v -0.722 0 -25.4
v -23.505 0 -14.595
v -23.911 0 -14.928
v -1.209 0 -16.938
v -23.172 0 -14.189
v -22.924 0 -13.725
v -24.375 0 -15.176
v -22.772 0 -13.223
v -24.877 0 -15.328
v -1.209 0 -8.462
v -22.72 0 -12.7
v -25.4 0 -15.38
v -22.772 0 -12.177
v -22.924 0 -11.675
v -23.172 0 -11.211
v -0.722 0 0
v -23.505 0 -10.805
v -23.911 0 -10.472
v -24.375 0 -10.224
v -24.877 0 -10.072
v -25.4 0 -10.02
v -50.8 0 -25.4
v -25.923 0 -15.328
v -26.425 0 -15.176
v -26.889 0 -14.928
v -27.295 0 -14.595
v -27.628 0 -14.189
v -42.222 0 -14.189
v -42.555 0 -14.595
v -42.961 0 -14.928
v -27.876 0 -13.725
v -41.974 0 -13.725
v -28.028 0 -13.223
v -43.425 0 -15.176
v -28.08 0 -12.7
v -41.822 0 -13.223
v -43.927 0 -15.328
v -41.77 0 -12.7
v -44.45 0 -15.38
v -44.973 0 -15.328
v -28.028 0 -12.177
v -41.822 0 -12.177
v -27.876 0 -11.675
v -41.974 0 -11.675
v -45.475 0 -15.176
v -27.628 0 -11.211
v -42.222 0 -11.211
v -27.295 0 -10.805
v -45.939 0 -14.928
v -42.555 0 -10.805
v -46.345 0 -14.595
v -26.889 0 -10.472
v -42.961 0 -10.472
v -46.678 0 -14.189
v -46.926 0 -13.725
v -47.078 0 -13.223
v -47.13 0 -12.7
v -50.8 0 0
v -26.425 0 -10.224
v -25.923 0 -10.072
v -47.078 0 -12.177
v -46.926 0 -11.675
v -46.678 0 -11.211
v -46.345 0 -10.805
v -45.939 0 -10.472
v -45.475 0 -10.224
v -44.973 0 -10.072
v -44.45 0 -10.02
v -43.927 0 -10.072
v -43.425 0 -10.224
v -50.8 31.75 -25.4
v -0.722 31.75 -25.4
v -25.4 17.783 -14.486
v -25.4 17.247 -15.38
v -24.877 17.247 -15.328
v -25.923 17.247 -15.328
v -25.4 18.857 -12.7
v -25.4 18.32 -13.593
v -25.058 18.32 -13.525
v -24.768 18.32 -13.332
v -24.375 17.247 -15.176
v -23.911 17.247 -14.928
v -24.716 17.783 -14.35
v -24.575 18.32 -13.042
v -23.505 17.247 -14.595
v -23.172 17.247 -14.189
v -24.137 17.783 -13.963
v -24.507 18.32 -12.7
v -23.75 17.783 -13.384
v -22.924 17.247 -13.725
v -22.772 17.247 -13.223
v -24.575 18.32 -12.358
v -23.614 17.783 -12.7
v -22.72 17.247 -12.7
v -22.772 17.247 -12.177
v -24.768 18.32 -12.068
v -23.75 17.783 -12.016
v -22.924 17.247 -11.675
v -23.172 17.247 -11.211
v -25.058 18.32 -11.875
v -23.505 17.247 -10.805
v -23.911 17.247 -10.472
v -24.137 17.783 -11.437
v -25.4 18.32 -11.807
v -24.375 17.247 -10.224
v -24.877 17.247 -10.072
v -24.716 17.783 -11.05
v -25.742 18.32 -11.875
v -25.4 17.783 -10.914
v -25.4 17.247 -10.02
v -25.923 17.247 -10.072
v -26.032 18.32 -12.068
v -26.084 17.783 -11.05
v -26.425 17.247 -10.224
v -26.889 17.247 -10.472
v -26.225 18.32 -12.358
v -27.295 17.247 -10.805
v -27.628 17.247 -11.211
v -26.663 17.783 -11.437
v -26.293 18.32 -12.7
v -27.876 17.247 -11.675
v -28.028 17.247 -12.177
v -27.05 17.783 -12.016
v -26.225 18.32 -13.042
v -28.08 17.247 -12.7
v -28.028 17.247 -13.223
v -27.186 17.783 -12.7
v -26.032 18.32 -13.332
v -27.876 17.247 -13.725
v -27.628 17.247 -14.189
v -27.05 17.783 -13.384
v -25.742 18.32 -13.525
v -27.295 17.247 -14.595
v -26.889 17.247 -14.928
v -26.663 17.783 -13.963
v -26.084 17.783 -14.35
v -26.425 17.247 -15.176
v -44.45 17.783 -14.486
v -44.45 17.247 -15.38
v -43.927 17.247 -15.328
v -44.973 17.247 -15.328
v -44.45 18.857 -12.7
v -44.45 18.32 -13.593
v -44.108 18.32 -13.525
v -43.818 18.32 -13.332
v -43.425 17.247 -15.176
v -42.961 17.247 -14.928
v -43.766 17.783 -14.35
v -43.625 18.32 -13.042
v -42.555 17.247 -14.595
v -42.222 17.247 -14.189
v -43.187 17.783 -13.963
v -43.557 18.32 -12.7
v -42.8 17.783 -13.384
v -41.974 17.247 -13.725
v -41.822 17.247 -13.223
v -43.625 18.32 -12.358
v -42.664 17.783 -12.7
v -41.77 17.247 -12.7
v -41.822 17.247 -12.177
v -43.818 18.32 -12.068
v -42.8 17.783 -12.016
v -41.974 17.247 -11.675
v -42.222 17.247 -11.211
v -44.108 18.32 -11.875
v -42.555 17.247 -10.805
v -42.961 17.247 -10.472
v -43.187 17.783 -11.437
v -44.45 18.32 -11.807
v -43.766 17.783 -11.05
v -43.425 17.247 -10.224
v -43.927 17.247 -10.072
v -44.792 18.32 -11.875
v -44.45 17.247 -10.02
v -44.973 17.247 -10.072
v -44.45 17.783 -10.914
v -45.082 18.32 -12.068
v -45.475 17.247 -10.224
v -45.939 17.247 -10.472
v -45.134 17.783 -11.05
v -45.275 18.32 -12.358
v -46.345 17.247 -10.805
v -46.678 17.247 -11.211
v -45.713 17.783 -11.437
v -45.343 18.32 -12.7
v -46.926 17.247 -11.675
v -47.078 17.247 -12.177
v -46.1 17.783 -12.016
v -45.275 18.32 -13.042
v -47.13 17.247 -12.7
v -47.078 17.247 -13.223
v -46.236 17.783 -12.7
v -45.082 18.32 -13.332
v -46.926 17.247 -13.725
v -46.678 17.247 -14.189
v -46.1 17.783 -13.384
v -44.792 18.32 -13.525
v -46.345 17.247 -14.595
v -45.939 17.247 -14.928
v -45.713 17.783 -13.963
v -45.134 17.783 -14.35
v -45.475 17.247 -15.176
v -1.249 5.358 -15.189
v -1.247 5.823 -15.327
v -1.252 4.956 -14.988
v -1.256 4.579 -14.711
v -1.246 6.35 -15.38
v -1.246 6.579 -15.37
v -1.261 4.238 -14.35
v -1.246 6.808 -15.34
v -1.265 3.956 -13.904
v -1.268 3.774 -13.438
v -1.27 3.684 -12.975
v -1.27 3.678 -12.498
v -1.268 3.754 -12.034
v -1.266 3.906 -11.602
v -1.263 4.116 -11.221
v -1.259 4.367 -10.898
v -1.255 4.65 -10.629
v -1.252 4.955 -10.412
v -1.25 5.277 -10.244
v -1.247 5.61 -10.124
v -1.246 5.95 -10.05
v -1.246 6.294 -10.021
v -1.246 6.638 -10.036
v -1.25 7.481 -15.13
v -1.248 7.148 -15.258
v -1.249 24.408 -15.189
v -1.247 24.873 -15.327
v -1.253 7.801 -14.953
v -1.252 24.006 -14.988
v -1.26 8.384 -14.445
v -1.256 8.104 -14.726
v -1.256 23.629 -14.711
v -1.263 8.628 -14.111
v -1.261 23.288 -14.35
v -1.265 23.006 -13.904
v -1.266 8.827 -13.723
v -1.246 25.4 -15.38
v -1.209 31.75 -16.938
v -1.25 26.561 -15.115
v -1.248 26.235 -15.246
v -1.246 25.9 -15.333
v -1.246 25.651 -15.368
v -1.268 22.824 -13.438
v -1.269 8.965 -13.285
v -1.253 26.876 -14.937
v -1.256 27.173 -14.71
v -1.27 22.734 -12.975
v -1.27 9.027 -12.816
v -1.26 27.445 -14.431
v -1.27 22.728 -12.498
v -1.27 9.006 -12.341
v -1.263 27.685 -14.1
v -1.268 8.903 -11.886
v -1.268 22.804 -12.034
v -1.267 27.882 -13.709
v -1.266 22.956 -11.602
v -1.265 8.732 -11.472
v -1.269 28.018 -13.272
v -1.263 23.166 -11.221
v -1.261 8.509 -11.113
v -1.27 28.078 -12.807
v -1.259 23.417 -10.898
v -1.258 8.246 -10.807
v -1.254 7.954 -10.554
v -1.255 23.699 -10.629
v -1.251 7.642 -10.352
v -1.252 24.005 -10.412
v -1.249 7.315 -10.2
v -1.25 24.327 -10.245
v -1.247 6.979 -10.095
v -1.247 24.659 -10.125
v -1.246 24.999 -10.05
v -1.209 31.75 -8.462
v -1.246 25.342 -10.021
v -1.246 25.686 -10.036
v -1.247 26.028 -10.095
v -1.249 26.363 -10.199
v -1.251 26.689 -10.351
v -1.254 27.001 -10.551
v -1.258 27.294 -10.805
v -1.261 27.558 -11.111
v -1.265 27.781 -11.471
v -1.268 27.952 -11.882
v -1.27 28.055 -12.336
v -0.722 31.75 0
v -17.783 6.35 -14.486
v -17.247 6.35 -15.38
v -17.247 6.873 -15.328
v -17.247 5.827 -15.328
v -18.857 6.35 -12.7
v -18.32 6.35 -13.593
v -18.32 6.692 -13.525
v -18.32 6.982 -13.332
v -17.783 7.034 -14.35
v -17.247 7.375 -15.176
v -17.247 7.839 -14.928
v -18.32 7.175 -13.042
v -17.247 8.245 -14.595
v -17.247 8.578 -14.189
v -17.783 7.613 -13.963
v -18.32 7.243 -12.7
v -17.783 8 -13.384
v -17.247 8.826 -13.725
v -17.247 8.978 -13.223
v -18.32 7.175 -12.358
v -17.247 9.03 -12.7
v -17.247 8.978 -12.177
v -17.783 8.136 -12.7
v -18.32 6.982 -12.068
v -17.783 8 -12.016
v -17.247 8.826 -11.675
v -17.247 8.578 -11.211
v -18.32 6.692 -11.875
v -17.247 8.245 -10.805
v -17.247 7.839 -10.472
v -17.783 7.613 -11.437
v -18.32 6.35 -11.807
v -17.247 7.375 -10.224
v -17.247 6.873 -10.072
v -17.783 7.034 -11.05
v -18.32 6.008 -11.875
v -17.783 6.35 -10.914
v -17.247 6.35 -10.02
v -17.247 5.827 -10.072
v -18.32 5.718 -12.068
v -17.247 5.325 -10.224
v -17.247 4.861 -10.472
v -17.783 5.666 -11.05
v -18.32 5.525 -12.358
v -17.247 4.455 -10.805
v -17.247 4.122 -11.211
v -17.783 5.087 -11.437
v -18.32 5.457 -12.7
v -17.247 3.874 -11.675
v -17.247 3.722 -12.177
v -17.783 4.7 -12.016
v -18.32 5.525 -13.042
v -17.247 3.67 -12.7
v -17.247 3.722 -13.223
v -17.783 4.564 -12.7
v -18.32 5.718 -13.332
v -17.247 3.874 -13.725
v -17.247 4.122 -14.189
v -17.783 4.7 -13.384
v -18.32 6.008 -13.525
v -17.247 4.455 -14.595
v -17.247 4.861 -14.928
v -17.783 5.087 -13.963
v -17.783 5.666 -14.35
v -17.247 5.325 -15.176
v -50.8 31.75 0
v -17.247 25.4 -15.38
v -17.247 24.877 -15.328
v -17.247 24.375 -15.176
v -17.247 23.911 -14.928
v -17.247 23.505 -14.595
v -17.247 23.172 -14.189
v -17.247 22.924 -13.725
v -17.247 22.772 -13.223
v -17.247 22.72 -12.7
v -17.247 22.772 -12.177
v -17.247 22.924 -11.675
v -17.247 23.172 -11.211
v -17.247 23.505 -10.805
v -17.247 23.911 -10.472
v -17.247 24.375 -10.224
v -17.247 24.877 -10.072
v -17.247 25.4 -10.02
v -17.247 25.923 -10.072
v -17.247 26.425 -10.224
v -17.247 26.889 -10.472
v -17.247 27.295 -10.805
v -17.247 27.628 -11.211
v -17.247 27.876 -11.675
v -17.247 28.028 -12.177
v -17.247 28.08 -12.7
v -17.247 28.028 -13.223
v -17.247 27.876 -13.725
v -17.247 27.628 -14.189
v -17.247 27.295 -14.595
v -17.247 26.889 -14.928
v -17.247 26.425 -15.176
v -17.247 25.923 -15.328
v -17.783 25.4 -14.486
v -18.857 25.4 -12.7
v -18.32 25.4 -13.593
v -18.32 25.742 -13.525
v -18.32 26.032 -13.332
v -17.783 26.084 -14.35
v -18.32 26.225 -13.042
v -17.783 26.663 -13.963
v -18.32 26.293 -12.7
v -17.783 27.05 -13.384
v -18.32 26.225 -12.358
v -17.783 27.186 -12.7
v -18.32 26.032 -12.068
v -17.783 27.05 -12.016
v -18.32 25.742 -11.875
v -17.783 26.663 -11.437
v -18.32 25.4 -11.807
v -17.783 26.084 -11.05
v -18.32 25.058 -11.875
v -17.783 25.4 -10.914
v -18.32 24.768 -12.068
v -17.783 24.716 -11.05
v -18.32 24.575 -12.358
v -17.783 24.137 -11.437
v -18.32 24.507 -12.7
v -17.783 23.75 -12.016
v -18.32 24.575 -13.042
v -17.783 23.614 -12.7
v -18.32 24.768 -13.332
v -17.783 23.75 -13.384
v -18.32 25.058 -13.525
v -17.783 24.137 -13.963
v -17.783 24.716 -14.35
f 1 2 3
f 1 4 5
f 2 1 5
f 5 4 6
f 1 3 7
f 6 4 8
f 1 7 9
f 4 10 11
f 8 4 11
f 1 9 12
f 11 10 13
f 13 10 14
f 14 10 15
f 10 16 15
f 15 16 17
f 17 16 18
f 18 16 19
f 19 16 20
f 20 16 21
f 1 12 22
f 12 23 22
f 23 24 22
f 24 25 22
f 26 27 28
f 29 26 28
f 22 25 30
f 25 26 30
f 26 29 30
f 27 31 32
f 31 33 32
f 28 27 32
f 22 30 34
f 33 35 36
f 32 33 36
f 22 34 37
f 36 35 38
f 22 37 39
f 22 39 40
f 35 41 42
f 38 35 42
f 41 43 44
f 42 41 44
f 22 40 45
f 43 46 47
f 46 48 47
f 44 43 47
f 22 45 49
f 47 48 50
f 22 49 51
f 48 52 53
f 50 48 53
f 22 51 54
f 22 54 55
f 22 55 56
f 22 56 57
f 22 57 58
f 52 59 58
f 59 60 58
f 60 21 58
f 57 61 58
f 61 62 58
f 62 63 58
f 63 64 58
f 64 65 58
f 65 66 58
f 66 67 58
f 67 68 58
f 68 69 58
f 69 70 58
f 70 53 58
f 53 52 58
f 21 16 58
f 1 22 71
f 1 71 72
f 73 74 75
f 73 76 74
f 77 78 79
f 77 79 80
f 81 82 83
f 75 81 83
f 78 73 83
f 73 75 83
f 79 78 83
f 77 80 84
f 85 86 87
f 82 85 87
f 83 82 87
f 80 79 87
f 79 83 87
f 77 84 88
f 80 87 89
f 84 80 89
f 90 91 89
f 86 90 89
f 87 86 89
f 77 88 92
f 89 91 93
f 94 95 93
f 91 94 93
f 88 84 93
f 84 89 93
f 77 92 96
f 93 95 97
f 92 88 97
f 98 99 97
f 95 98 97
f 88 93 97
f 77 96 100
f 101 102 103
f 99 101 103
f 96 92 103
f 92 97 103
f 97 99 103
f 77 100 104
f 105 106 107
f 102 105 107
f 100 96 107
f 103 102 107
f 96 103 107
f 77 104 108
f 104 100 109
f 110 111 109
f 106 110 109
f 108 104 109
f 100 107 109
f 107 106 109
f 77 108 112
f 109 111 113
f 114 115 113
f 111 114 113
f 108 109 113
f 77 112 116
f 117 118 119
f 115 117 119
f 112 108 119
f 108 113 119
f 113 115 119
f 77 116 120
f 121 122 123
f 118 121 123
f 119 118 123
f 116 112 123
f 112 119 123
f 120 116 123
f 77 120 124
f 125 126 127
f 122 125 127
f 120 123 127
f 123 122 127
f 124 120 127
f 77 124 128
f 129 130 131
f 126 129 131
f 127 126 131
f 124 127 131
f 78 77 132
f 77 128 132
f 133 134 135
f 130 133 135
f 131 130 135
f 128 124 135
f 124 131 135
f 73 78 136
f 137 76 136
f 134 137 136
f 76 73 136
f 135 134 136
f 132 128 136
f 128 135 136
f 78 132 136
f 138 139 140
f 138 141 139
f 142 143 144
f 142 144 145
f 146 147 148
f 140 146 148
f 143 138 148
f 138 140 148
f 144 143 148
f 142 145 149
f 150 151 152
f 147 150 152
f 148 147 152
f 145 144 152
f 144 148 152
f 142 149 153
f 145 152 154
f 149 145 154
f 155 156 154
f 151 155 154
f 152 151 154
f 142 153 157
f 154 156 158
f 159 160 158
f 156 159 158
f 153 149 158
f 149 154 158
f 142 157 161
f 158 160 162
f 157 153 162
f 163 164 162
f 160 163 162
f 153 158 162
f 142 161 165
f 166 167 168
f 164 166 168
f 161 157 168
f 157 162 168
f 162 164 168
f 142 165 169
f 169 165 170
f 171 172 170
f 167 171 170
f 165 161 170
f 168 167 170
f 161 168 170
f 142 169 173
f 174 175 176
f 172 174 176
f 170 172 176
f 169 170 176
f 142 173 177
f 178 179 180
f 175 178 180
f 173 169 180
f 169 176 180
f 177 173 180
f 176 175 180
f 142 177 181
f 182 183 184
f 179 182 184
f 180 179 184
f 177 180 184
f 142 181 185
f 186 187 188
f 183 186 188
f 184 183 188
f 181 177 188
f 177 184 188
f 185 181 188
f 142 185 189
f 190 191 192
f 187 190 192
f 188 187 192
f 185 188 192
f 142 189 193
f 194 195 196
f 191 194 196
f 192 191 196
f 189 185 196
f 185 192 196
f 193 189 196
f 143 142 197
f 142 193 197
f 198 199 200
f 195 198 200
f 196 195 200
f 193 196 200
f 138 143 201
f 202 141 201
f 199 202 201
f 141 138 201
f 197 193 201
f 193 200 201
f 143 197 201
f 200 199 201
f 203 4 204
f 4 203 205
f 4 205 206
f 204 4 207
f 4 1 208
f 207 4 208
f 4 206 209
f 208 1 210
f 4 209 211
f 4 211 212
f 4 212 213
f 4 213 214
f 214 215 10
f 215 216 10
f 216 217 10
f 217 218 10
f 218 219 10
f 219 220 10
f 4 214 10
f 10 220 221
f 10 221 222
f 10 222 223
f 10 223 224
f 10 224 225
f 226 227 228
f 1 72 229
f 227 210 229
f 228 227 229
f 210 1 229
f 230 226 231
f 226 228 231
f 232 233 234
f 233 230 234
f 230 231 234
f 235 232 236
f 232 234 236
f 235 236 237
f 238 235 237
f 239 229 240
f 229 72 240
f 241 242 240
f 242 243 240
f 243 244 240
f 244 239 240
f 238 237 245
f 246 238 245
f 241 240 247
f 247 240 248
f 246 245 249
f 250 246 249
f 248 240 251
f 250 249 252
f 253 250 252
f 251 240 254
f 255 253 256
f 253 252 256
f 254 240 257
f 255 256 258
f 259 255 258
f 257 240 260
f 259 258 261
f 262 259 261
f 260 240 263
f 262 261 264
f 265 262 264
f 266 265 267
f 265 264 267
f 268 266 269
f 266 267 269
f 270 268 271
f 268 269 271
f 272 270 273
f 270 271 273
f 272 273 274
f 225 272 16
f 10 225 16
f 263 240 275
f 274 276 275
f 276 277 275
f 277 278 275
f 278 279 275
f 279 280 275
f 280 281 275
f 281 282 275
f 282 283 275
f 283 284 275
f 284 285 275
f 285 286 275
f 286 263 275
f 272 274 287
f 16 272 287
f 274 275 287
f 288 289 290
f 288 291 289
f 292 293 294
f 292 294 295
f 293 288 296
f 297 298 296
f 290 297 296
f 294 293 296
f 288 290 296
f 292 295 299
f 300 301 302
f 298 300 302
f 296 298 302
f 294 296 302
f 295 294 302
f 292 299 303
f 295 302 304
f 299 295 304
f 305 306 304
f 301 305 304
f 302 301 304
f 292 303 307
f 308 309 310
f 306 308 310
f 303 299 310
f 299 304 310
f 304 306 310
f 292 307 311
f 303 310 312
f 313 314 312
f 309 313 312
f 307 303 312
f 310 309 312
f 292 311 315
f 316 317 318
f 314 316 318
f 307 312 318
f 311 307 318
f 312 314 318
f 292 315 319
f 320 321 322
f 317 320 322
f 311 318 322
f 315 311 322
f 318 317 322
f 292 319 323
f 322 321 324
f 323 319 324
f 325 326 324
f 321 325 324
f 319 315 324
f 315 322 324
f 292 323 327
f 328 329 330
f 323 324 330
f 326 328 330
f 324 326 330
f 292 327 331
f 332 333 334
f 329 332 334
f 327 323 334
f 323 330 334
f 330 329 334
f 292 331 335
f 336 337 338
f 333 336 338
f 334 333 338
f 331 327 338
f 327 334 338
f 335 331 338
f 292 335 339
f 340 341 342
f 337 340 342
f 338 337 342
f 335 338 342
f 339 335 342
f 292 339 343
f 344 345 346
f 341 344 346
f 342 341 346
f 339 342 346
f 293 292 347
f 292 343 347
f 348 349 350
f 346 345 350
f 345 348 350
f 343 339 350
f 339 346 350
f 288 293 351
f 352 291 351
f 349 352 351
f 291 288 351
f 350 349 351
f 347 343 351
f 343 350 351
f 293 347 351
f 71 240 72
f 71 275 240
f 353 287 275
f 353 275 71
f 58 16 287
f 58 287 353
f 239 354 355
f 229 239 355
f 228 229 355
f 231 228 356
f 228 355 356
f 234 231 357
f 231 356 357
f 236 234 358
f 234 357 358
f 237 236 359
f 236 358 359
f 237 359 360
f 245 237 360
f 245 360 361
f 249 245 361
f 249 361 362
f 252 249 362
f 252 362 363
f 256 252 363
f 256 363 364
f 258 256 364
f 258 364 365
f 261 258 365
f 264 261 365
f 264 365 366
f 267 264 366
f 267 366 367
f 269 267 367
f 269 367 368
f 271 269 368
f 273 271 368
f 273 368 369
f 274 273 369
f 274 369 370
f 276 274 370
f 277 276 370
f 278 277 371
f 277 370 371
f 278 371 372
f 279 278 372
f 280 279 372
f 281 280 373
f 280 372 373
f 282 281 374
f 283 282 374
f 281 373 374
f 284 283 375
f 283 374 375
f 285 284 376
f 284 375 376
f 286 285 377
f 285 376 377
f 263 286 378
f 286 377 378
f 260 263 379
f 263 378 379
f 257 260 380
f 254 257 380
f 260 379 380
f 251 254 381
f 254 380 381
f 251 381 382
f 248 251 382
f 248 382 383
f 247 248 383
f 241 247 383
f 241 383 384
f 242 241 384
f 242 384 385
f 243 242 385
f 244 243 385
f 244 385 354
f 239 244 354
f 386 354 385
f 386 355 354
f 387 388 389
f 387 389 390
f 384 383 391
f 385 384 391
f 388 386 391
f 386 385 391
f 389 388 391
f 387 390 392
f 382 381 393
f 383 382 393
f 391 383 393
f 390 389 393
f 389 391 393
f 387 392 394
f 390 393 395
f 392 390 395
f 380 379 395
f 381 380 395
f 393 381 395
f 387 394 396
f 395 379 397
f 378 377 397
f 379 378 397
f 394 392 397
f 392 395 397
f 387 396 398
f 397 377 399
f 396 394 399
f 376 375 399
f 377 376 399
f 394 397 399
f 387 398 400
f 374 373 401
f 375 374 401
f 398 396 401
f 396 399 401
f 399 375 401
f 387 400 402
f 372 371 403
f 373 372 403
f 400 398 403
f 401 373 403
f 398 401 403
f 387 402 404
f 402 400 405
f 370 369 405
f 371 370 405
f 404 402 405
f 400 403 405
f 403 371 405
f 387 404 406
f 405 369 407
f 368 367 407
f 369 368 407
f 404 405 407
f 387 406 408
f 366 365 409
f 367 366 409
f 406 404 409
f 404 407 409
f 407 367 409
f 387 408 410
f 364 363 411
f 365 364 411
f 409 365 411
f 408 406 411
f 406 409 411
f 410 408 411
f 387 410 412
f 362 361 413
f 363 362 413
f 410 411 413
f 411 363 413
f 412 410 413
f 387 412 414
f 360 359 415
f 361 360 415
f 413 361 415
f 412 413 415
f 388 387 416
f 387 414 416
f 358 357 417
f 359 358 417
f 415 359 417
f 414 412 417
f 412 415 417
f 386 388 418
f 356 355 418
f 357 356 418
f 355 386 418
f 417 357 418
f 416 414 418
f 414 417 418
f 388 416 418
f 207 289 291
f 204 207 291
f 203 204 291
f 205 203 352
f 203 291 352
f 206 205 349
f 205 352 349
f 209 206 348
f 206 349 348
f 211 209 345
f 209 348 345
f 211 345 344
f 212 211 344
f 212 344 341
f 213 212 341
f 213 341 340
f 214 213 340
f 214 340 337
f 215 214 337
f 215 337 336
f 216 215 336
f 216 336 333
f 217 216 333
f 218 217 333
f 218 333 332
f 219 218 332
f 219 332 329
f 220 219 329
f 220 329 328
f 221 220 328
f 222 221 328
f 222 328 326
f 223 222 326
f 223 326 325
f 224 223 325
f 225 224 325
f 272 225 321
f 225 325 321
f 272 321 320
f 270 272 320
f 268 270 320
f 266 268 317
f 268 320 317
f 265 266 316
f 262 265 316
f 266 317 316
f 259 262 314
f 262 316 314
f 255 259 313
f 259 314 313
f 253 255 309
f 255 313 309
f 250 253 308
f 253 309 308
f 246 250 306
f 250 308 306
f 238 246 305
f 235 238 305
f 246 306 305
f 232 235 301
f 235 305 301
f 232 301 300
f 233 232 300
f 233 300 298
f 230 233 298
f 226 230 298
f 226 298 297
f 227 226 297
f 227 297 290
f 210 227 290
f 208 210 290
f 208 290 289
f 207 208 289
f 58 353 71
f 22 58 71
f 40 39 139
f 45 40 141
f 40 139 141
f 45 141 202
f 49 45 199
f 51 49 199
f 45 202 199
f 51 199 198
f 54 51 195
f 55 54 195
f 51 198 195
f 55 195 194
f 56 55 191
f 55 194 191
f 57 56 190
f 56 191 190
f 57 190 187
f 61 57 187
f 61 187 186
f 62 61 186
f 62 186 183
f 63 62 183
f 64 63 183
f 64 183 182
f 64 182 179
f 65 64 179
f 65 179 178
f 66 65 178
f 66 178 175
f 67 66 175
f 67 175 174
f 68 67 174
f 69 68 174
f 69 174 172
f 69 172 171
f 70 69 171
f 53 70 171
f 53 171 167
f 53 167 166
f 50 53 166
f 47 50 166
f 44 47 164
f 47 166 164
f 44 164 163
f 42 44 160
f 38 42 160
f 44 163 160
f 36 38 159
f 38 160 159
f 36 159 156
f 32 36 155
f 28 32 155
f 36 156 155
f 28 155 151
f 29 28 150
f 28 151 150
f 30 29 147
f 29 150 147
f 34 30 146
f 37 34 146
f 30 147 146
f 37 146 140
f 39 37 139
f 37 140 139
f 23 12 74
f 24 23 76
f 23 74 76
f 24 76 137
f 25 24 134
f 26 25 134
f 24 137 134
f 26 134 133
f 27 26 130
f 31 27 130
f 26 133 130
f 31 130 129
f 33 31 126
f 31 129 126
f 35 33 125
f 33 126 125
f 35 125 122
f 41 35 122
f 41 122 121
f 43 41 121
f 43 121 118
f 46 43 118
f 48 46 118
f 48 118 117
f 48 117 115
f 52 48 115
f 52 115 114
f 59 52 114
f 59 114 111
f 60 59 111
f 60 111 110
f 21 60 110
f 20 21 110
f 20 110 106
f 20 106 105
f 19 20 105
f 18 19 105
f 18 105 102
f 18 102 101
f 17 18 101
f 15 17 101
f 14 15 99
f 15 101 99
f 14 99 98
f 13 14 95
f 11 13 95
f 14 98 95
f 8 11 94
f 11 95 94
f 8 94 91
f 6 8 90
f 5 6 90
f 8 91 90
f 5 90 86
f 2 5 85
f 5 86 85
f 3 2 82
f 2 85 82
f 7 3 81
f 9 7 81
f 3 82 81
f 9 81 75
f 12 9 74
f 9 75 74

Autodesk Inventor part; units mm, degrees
ref_plane "YZ Plane" through (0, 0, 0) normal (1, 0, 0) x (0, 1, 0)
ref_plane "XZ Plane" through (0, 0, 0) normal (0, 1, 0) x (-1, 0, 0)
ref_plane "XY Plane" through (0, 0, 0) normal (0, 0, 1) x (1, 0, 0)
sketch "Sketch1" plane through (0, 0, 0) normal (0, 1, 0) x (-1, 0, 0)
  line L0 (0, 0) -> (50.8, 0)
  line L1 (50.8, 0) -> (50.8, -25.4)
  line L2 (50.8, -25.4) -> (0, -25.4)
  line L3 (0, -25.4) -> (0, 0)
  dimension "d0" = 25.4
  dimension "d1" = 50.8
extrude "Extrusion1" add sketch "Sketch1" along normal blind 31.75
sketch "Sketch3" plane through (0, 0, 0) normal (1, 0, 0) x (0, 0, -1)
  circle A0 centre (12.7, 25.4) radius 2.581
  line L0 (0, 31.75) -> (25.4, 31.75) projected
  circle A1 centre (12.7, 6.35) radius 2.3807
  point P0 (0, 0)
  dimension "d6" = 6.35
  dimension "d7" = 19.05
hole "Hole1" at (0, 25.4, -12.7) at (0, 6.35, -12.7) direction (-1, 0, 0) diameter 5.3594 depth 17.2466 tip angle 118 thread size "1/4-28 UNF" class "2B" standard "ANSI Unified Screw Threads"
sketch "Sketch4" plane through (0, 31.75, 0) normal (0, 1, 0) x (1, 0, 0)
  line L0 (0, 0) -> (0, 25.4) projected
  line L1 (0, 12.7) -> (146.05, 12.7) construction
  circle A0 centre (146.05, 12.7) radius 147.32
  dimension "d15" = 146.05
  dimension "d16" = 294.64
extrude "Extrusion2" cut sketch "Sketch4" against normal blind 50.8
sketch "Sketch6" plane through (0, 0, 0) normal (0, -1, 0) x (1, 0, 0)
  circle A0 centre (-44.45, -12.7) radius 4.2294
  line L0 (-0.7216, 0) -> (-50.8, 0) projected
  line L1 (-50.8, 0) -> (-50.8, -25.4) projected
  circle A1 centre (-25.4, -12.7) radius 3.8351
  point P0 (0, 0)
  dimension "d21" = 12.7
  dimension "d22" = 6.35
  dimension "d23" = 19.05
hole "Hole2" at (-44.45, 0, -12.7) at (-25.4, 0, -12.7) direction (0, 1, 0) diameter 5.3594 depth 17.2466 tip angle 118 thread size "1/4-28 UNF" class "2B" standard "ANSI Unified Screw Threads"
properties part number "mountingStub" material "Aluminum 6061"
